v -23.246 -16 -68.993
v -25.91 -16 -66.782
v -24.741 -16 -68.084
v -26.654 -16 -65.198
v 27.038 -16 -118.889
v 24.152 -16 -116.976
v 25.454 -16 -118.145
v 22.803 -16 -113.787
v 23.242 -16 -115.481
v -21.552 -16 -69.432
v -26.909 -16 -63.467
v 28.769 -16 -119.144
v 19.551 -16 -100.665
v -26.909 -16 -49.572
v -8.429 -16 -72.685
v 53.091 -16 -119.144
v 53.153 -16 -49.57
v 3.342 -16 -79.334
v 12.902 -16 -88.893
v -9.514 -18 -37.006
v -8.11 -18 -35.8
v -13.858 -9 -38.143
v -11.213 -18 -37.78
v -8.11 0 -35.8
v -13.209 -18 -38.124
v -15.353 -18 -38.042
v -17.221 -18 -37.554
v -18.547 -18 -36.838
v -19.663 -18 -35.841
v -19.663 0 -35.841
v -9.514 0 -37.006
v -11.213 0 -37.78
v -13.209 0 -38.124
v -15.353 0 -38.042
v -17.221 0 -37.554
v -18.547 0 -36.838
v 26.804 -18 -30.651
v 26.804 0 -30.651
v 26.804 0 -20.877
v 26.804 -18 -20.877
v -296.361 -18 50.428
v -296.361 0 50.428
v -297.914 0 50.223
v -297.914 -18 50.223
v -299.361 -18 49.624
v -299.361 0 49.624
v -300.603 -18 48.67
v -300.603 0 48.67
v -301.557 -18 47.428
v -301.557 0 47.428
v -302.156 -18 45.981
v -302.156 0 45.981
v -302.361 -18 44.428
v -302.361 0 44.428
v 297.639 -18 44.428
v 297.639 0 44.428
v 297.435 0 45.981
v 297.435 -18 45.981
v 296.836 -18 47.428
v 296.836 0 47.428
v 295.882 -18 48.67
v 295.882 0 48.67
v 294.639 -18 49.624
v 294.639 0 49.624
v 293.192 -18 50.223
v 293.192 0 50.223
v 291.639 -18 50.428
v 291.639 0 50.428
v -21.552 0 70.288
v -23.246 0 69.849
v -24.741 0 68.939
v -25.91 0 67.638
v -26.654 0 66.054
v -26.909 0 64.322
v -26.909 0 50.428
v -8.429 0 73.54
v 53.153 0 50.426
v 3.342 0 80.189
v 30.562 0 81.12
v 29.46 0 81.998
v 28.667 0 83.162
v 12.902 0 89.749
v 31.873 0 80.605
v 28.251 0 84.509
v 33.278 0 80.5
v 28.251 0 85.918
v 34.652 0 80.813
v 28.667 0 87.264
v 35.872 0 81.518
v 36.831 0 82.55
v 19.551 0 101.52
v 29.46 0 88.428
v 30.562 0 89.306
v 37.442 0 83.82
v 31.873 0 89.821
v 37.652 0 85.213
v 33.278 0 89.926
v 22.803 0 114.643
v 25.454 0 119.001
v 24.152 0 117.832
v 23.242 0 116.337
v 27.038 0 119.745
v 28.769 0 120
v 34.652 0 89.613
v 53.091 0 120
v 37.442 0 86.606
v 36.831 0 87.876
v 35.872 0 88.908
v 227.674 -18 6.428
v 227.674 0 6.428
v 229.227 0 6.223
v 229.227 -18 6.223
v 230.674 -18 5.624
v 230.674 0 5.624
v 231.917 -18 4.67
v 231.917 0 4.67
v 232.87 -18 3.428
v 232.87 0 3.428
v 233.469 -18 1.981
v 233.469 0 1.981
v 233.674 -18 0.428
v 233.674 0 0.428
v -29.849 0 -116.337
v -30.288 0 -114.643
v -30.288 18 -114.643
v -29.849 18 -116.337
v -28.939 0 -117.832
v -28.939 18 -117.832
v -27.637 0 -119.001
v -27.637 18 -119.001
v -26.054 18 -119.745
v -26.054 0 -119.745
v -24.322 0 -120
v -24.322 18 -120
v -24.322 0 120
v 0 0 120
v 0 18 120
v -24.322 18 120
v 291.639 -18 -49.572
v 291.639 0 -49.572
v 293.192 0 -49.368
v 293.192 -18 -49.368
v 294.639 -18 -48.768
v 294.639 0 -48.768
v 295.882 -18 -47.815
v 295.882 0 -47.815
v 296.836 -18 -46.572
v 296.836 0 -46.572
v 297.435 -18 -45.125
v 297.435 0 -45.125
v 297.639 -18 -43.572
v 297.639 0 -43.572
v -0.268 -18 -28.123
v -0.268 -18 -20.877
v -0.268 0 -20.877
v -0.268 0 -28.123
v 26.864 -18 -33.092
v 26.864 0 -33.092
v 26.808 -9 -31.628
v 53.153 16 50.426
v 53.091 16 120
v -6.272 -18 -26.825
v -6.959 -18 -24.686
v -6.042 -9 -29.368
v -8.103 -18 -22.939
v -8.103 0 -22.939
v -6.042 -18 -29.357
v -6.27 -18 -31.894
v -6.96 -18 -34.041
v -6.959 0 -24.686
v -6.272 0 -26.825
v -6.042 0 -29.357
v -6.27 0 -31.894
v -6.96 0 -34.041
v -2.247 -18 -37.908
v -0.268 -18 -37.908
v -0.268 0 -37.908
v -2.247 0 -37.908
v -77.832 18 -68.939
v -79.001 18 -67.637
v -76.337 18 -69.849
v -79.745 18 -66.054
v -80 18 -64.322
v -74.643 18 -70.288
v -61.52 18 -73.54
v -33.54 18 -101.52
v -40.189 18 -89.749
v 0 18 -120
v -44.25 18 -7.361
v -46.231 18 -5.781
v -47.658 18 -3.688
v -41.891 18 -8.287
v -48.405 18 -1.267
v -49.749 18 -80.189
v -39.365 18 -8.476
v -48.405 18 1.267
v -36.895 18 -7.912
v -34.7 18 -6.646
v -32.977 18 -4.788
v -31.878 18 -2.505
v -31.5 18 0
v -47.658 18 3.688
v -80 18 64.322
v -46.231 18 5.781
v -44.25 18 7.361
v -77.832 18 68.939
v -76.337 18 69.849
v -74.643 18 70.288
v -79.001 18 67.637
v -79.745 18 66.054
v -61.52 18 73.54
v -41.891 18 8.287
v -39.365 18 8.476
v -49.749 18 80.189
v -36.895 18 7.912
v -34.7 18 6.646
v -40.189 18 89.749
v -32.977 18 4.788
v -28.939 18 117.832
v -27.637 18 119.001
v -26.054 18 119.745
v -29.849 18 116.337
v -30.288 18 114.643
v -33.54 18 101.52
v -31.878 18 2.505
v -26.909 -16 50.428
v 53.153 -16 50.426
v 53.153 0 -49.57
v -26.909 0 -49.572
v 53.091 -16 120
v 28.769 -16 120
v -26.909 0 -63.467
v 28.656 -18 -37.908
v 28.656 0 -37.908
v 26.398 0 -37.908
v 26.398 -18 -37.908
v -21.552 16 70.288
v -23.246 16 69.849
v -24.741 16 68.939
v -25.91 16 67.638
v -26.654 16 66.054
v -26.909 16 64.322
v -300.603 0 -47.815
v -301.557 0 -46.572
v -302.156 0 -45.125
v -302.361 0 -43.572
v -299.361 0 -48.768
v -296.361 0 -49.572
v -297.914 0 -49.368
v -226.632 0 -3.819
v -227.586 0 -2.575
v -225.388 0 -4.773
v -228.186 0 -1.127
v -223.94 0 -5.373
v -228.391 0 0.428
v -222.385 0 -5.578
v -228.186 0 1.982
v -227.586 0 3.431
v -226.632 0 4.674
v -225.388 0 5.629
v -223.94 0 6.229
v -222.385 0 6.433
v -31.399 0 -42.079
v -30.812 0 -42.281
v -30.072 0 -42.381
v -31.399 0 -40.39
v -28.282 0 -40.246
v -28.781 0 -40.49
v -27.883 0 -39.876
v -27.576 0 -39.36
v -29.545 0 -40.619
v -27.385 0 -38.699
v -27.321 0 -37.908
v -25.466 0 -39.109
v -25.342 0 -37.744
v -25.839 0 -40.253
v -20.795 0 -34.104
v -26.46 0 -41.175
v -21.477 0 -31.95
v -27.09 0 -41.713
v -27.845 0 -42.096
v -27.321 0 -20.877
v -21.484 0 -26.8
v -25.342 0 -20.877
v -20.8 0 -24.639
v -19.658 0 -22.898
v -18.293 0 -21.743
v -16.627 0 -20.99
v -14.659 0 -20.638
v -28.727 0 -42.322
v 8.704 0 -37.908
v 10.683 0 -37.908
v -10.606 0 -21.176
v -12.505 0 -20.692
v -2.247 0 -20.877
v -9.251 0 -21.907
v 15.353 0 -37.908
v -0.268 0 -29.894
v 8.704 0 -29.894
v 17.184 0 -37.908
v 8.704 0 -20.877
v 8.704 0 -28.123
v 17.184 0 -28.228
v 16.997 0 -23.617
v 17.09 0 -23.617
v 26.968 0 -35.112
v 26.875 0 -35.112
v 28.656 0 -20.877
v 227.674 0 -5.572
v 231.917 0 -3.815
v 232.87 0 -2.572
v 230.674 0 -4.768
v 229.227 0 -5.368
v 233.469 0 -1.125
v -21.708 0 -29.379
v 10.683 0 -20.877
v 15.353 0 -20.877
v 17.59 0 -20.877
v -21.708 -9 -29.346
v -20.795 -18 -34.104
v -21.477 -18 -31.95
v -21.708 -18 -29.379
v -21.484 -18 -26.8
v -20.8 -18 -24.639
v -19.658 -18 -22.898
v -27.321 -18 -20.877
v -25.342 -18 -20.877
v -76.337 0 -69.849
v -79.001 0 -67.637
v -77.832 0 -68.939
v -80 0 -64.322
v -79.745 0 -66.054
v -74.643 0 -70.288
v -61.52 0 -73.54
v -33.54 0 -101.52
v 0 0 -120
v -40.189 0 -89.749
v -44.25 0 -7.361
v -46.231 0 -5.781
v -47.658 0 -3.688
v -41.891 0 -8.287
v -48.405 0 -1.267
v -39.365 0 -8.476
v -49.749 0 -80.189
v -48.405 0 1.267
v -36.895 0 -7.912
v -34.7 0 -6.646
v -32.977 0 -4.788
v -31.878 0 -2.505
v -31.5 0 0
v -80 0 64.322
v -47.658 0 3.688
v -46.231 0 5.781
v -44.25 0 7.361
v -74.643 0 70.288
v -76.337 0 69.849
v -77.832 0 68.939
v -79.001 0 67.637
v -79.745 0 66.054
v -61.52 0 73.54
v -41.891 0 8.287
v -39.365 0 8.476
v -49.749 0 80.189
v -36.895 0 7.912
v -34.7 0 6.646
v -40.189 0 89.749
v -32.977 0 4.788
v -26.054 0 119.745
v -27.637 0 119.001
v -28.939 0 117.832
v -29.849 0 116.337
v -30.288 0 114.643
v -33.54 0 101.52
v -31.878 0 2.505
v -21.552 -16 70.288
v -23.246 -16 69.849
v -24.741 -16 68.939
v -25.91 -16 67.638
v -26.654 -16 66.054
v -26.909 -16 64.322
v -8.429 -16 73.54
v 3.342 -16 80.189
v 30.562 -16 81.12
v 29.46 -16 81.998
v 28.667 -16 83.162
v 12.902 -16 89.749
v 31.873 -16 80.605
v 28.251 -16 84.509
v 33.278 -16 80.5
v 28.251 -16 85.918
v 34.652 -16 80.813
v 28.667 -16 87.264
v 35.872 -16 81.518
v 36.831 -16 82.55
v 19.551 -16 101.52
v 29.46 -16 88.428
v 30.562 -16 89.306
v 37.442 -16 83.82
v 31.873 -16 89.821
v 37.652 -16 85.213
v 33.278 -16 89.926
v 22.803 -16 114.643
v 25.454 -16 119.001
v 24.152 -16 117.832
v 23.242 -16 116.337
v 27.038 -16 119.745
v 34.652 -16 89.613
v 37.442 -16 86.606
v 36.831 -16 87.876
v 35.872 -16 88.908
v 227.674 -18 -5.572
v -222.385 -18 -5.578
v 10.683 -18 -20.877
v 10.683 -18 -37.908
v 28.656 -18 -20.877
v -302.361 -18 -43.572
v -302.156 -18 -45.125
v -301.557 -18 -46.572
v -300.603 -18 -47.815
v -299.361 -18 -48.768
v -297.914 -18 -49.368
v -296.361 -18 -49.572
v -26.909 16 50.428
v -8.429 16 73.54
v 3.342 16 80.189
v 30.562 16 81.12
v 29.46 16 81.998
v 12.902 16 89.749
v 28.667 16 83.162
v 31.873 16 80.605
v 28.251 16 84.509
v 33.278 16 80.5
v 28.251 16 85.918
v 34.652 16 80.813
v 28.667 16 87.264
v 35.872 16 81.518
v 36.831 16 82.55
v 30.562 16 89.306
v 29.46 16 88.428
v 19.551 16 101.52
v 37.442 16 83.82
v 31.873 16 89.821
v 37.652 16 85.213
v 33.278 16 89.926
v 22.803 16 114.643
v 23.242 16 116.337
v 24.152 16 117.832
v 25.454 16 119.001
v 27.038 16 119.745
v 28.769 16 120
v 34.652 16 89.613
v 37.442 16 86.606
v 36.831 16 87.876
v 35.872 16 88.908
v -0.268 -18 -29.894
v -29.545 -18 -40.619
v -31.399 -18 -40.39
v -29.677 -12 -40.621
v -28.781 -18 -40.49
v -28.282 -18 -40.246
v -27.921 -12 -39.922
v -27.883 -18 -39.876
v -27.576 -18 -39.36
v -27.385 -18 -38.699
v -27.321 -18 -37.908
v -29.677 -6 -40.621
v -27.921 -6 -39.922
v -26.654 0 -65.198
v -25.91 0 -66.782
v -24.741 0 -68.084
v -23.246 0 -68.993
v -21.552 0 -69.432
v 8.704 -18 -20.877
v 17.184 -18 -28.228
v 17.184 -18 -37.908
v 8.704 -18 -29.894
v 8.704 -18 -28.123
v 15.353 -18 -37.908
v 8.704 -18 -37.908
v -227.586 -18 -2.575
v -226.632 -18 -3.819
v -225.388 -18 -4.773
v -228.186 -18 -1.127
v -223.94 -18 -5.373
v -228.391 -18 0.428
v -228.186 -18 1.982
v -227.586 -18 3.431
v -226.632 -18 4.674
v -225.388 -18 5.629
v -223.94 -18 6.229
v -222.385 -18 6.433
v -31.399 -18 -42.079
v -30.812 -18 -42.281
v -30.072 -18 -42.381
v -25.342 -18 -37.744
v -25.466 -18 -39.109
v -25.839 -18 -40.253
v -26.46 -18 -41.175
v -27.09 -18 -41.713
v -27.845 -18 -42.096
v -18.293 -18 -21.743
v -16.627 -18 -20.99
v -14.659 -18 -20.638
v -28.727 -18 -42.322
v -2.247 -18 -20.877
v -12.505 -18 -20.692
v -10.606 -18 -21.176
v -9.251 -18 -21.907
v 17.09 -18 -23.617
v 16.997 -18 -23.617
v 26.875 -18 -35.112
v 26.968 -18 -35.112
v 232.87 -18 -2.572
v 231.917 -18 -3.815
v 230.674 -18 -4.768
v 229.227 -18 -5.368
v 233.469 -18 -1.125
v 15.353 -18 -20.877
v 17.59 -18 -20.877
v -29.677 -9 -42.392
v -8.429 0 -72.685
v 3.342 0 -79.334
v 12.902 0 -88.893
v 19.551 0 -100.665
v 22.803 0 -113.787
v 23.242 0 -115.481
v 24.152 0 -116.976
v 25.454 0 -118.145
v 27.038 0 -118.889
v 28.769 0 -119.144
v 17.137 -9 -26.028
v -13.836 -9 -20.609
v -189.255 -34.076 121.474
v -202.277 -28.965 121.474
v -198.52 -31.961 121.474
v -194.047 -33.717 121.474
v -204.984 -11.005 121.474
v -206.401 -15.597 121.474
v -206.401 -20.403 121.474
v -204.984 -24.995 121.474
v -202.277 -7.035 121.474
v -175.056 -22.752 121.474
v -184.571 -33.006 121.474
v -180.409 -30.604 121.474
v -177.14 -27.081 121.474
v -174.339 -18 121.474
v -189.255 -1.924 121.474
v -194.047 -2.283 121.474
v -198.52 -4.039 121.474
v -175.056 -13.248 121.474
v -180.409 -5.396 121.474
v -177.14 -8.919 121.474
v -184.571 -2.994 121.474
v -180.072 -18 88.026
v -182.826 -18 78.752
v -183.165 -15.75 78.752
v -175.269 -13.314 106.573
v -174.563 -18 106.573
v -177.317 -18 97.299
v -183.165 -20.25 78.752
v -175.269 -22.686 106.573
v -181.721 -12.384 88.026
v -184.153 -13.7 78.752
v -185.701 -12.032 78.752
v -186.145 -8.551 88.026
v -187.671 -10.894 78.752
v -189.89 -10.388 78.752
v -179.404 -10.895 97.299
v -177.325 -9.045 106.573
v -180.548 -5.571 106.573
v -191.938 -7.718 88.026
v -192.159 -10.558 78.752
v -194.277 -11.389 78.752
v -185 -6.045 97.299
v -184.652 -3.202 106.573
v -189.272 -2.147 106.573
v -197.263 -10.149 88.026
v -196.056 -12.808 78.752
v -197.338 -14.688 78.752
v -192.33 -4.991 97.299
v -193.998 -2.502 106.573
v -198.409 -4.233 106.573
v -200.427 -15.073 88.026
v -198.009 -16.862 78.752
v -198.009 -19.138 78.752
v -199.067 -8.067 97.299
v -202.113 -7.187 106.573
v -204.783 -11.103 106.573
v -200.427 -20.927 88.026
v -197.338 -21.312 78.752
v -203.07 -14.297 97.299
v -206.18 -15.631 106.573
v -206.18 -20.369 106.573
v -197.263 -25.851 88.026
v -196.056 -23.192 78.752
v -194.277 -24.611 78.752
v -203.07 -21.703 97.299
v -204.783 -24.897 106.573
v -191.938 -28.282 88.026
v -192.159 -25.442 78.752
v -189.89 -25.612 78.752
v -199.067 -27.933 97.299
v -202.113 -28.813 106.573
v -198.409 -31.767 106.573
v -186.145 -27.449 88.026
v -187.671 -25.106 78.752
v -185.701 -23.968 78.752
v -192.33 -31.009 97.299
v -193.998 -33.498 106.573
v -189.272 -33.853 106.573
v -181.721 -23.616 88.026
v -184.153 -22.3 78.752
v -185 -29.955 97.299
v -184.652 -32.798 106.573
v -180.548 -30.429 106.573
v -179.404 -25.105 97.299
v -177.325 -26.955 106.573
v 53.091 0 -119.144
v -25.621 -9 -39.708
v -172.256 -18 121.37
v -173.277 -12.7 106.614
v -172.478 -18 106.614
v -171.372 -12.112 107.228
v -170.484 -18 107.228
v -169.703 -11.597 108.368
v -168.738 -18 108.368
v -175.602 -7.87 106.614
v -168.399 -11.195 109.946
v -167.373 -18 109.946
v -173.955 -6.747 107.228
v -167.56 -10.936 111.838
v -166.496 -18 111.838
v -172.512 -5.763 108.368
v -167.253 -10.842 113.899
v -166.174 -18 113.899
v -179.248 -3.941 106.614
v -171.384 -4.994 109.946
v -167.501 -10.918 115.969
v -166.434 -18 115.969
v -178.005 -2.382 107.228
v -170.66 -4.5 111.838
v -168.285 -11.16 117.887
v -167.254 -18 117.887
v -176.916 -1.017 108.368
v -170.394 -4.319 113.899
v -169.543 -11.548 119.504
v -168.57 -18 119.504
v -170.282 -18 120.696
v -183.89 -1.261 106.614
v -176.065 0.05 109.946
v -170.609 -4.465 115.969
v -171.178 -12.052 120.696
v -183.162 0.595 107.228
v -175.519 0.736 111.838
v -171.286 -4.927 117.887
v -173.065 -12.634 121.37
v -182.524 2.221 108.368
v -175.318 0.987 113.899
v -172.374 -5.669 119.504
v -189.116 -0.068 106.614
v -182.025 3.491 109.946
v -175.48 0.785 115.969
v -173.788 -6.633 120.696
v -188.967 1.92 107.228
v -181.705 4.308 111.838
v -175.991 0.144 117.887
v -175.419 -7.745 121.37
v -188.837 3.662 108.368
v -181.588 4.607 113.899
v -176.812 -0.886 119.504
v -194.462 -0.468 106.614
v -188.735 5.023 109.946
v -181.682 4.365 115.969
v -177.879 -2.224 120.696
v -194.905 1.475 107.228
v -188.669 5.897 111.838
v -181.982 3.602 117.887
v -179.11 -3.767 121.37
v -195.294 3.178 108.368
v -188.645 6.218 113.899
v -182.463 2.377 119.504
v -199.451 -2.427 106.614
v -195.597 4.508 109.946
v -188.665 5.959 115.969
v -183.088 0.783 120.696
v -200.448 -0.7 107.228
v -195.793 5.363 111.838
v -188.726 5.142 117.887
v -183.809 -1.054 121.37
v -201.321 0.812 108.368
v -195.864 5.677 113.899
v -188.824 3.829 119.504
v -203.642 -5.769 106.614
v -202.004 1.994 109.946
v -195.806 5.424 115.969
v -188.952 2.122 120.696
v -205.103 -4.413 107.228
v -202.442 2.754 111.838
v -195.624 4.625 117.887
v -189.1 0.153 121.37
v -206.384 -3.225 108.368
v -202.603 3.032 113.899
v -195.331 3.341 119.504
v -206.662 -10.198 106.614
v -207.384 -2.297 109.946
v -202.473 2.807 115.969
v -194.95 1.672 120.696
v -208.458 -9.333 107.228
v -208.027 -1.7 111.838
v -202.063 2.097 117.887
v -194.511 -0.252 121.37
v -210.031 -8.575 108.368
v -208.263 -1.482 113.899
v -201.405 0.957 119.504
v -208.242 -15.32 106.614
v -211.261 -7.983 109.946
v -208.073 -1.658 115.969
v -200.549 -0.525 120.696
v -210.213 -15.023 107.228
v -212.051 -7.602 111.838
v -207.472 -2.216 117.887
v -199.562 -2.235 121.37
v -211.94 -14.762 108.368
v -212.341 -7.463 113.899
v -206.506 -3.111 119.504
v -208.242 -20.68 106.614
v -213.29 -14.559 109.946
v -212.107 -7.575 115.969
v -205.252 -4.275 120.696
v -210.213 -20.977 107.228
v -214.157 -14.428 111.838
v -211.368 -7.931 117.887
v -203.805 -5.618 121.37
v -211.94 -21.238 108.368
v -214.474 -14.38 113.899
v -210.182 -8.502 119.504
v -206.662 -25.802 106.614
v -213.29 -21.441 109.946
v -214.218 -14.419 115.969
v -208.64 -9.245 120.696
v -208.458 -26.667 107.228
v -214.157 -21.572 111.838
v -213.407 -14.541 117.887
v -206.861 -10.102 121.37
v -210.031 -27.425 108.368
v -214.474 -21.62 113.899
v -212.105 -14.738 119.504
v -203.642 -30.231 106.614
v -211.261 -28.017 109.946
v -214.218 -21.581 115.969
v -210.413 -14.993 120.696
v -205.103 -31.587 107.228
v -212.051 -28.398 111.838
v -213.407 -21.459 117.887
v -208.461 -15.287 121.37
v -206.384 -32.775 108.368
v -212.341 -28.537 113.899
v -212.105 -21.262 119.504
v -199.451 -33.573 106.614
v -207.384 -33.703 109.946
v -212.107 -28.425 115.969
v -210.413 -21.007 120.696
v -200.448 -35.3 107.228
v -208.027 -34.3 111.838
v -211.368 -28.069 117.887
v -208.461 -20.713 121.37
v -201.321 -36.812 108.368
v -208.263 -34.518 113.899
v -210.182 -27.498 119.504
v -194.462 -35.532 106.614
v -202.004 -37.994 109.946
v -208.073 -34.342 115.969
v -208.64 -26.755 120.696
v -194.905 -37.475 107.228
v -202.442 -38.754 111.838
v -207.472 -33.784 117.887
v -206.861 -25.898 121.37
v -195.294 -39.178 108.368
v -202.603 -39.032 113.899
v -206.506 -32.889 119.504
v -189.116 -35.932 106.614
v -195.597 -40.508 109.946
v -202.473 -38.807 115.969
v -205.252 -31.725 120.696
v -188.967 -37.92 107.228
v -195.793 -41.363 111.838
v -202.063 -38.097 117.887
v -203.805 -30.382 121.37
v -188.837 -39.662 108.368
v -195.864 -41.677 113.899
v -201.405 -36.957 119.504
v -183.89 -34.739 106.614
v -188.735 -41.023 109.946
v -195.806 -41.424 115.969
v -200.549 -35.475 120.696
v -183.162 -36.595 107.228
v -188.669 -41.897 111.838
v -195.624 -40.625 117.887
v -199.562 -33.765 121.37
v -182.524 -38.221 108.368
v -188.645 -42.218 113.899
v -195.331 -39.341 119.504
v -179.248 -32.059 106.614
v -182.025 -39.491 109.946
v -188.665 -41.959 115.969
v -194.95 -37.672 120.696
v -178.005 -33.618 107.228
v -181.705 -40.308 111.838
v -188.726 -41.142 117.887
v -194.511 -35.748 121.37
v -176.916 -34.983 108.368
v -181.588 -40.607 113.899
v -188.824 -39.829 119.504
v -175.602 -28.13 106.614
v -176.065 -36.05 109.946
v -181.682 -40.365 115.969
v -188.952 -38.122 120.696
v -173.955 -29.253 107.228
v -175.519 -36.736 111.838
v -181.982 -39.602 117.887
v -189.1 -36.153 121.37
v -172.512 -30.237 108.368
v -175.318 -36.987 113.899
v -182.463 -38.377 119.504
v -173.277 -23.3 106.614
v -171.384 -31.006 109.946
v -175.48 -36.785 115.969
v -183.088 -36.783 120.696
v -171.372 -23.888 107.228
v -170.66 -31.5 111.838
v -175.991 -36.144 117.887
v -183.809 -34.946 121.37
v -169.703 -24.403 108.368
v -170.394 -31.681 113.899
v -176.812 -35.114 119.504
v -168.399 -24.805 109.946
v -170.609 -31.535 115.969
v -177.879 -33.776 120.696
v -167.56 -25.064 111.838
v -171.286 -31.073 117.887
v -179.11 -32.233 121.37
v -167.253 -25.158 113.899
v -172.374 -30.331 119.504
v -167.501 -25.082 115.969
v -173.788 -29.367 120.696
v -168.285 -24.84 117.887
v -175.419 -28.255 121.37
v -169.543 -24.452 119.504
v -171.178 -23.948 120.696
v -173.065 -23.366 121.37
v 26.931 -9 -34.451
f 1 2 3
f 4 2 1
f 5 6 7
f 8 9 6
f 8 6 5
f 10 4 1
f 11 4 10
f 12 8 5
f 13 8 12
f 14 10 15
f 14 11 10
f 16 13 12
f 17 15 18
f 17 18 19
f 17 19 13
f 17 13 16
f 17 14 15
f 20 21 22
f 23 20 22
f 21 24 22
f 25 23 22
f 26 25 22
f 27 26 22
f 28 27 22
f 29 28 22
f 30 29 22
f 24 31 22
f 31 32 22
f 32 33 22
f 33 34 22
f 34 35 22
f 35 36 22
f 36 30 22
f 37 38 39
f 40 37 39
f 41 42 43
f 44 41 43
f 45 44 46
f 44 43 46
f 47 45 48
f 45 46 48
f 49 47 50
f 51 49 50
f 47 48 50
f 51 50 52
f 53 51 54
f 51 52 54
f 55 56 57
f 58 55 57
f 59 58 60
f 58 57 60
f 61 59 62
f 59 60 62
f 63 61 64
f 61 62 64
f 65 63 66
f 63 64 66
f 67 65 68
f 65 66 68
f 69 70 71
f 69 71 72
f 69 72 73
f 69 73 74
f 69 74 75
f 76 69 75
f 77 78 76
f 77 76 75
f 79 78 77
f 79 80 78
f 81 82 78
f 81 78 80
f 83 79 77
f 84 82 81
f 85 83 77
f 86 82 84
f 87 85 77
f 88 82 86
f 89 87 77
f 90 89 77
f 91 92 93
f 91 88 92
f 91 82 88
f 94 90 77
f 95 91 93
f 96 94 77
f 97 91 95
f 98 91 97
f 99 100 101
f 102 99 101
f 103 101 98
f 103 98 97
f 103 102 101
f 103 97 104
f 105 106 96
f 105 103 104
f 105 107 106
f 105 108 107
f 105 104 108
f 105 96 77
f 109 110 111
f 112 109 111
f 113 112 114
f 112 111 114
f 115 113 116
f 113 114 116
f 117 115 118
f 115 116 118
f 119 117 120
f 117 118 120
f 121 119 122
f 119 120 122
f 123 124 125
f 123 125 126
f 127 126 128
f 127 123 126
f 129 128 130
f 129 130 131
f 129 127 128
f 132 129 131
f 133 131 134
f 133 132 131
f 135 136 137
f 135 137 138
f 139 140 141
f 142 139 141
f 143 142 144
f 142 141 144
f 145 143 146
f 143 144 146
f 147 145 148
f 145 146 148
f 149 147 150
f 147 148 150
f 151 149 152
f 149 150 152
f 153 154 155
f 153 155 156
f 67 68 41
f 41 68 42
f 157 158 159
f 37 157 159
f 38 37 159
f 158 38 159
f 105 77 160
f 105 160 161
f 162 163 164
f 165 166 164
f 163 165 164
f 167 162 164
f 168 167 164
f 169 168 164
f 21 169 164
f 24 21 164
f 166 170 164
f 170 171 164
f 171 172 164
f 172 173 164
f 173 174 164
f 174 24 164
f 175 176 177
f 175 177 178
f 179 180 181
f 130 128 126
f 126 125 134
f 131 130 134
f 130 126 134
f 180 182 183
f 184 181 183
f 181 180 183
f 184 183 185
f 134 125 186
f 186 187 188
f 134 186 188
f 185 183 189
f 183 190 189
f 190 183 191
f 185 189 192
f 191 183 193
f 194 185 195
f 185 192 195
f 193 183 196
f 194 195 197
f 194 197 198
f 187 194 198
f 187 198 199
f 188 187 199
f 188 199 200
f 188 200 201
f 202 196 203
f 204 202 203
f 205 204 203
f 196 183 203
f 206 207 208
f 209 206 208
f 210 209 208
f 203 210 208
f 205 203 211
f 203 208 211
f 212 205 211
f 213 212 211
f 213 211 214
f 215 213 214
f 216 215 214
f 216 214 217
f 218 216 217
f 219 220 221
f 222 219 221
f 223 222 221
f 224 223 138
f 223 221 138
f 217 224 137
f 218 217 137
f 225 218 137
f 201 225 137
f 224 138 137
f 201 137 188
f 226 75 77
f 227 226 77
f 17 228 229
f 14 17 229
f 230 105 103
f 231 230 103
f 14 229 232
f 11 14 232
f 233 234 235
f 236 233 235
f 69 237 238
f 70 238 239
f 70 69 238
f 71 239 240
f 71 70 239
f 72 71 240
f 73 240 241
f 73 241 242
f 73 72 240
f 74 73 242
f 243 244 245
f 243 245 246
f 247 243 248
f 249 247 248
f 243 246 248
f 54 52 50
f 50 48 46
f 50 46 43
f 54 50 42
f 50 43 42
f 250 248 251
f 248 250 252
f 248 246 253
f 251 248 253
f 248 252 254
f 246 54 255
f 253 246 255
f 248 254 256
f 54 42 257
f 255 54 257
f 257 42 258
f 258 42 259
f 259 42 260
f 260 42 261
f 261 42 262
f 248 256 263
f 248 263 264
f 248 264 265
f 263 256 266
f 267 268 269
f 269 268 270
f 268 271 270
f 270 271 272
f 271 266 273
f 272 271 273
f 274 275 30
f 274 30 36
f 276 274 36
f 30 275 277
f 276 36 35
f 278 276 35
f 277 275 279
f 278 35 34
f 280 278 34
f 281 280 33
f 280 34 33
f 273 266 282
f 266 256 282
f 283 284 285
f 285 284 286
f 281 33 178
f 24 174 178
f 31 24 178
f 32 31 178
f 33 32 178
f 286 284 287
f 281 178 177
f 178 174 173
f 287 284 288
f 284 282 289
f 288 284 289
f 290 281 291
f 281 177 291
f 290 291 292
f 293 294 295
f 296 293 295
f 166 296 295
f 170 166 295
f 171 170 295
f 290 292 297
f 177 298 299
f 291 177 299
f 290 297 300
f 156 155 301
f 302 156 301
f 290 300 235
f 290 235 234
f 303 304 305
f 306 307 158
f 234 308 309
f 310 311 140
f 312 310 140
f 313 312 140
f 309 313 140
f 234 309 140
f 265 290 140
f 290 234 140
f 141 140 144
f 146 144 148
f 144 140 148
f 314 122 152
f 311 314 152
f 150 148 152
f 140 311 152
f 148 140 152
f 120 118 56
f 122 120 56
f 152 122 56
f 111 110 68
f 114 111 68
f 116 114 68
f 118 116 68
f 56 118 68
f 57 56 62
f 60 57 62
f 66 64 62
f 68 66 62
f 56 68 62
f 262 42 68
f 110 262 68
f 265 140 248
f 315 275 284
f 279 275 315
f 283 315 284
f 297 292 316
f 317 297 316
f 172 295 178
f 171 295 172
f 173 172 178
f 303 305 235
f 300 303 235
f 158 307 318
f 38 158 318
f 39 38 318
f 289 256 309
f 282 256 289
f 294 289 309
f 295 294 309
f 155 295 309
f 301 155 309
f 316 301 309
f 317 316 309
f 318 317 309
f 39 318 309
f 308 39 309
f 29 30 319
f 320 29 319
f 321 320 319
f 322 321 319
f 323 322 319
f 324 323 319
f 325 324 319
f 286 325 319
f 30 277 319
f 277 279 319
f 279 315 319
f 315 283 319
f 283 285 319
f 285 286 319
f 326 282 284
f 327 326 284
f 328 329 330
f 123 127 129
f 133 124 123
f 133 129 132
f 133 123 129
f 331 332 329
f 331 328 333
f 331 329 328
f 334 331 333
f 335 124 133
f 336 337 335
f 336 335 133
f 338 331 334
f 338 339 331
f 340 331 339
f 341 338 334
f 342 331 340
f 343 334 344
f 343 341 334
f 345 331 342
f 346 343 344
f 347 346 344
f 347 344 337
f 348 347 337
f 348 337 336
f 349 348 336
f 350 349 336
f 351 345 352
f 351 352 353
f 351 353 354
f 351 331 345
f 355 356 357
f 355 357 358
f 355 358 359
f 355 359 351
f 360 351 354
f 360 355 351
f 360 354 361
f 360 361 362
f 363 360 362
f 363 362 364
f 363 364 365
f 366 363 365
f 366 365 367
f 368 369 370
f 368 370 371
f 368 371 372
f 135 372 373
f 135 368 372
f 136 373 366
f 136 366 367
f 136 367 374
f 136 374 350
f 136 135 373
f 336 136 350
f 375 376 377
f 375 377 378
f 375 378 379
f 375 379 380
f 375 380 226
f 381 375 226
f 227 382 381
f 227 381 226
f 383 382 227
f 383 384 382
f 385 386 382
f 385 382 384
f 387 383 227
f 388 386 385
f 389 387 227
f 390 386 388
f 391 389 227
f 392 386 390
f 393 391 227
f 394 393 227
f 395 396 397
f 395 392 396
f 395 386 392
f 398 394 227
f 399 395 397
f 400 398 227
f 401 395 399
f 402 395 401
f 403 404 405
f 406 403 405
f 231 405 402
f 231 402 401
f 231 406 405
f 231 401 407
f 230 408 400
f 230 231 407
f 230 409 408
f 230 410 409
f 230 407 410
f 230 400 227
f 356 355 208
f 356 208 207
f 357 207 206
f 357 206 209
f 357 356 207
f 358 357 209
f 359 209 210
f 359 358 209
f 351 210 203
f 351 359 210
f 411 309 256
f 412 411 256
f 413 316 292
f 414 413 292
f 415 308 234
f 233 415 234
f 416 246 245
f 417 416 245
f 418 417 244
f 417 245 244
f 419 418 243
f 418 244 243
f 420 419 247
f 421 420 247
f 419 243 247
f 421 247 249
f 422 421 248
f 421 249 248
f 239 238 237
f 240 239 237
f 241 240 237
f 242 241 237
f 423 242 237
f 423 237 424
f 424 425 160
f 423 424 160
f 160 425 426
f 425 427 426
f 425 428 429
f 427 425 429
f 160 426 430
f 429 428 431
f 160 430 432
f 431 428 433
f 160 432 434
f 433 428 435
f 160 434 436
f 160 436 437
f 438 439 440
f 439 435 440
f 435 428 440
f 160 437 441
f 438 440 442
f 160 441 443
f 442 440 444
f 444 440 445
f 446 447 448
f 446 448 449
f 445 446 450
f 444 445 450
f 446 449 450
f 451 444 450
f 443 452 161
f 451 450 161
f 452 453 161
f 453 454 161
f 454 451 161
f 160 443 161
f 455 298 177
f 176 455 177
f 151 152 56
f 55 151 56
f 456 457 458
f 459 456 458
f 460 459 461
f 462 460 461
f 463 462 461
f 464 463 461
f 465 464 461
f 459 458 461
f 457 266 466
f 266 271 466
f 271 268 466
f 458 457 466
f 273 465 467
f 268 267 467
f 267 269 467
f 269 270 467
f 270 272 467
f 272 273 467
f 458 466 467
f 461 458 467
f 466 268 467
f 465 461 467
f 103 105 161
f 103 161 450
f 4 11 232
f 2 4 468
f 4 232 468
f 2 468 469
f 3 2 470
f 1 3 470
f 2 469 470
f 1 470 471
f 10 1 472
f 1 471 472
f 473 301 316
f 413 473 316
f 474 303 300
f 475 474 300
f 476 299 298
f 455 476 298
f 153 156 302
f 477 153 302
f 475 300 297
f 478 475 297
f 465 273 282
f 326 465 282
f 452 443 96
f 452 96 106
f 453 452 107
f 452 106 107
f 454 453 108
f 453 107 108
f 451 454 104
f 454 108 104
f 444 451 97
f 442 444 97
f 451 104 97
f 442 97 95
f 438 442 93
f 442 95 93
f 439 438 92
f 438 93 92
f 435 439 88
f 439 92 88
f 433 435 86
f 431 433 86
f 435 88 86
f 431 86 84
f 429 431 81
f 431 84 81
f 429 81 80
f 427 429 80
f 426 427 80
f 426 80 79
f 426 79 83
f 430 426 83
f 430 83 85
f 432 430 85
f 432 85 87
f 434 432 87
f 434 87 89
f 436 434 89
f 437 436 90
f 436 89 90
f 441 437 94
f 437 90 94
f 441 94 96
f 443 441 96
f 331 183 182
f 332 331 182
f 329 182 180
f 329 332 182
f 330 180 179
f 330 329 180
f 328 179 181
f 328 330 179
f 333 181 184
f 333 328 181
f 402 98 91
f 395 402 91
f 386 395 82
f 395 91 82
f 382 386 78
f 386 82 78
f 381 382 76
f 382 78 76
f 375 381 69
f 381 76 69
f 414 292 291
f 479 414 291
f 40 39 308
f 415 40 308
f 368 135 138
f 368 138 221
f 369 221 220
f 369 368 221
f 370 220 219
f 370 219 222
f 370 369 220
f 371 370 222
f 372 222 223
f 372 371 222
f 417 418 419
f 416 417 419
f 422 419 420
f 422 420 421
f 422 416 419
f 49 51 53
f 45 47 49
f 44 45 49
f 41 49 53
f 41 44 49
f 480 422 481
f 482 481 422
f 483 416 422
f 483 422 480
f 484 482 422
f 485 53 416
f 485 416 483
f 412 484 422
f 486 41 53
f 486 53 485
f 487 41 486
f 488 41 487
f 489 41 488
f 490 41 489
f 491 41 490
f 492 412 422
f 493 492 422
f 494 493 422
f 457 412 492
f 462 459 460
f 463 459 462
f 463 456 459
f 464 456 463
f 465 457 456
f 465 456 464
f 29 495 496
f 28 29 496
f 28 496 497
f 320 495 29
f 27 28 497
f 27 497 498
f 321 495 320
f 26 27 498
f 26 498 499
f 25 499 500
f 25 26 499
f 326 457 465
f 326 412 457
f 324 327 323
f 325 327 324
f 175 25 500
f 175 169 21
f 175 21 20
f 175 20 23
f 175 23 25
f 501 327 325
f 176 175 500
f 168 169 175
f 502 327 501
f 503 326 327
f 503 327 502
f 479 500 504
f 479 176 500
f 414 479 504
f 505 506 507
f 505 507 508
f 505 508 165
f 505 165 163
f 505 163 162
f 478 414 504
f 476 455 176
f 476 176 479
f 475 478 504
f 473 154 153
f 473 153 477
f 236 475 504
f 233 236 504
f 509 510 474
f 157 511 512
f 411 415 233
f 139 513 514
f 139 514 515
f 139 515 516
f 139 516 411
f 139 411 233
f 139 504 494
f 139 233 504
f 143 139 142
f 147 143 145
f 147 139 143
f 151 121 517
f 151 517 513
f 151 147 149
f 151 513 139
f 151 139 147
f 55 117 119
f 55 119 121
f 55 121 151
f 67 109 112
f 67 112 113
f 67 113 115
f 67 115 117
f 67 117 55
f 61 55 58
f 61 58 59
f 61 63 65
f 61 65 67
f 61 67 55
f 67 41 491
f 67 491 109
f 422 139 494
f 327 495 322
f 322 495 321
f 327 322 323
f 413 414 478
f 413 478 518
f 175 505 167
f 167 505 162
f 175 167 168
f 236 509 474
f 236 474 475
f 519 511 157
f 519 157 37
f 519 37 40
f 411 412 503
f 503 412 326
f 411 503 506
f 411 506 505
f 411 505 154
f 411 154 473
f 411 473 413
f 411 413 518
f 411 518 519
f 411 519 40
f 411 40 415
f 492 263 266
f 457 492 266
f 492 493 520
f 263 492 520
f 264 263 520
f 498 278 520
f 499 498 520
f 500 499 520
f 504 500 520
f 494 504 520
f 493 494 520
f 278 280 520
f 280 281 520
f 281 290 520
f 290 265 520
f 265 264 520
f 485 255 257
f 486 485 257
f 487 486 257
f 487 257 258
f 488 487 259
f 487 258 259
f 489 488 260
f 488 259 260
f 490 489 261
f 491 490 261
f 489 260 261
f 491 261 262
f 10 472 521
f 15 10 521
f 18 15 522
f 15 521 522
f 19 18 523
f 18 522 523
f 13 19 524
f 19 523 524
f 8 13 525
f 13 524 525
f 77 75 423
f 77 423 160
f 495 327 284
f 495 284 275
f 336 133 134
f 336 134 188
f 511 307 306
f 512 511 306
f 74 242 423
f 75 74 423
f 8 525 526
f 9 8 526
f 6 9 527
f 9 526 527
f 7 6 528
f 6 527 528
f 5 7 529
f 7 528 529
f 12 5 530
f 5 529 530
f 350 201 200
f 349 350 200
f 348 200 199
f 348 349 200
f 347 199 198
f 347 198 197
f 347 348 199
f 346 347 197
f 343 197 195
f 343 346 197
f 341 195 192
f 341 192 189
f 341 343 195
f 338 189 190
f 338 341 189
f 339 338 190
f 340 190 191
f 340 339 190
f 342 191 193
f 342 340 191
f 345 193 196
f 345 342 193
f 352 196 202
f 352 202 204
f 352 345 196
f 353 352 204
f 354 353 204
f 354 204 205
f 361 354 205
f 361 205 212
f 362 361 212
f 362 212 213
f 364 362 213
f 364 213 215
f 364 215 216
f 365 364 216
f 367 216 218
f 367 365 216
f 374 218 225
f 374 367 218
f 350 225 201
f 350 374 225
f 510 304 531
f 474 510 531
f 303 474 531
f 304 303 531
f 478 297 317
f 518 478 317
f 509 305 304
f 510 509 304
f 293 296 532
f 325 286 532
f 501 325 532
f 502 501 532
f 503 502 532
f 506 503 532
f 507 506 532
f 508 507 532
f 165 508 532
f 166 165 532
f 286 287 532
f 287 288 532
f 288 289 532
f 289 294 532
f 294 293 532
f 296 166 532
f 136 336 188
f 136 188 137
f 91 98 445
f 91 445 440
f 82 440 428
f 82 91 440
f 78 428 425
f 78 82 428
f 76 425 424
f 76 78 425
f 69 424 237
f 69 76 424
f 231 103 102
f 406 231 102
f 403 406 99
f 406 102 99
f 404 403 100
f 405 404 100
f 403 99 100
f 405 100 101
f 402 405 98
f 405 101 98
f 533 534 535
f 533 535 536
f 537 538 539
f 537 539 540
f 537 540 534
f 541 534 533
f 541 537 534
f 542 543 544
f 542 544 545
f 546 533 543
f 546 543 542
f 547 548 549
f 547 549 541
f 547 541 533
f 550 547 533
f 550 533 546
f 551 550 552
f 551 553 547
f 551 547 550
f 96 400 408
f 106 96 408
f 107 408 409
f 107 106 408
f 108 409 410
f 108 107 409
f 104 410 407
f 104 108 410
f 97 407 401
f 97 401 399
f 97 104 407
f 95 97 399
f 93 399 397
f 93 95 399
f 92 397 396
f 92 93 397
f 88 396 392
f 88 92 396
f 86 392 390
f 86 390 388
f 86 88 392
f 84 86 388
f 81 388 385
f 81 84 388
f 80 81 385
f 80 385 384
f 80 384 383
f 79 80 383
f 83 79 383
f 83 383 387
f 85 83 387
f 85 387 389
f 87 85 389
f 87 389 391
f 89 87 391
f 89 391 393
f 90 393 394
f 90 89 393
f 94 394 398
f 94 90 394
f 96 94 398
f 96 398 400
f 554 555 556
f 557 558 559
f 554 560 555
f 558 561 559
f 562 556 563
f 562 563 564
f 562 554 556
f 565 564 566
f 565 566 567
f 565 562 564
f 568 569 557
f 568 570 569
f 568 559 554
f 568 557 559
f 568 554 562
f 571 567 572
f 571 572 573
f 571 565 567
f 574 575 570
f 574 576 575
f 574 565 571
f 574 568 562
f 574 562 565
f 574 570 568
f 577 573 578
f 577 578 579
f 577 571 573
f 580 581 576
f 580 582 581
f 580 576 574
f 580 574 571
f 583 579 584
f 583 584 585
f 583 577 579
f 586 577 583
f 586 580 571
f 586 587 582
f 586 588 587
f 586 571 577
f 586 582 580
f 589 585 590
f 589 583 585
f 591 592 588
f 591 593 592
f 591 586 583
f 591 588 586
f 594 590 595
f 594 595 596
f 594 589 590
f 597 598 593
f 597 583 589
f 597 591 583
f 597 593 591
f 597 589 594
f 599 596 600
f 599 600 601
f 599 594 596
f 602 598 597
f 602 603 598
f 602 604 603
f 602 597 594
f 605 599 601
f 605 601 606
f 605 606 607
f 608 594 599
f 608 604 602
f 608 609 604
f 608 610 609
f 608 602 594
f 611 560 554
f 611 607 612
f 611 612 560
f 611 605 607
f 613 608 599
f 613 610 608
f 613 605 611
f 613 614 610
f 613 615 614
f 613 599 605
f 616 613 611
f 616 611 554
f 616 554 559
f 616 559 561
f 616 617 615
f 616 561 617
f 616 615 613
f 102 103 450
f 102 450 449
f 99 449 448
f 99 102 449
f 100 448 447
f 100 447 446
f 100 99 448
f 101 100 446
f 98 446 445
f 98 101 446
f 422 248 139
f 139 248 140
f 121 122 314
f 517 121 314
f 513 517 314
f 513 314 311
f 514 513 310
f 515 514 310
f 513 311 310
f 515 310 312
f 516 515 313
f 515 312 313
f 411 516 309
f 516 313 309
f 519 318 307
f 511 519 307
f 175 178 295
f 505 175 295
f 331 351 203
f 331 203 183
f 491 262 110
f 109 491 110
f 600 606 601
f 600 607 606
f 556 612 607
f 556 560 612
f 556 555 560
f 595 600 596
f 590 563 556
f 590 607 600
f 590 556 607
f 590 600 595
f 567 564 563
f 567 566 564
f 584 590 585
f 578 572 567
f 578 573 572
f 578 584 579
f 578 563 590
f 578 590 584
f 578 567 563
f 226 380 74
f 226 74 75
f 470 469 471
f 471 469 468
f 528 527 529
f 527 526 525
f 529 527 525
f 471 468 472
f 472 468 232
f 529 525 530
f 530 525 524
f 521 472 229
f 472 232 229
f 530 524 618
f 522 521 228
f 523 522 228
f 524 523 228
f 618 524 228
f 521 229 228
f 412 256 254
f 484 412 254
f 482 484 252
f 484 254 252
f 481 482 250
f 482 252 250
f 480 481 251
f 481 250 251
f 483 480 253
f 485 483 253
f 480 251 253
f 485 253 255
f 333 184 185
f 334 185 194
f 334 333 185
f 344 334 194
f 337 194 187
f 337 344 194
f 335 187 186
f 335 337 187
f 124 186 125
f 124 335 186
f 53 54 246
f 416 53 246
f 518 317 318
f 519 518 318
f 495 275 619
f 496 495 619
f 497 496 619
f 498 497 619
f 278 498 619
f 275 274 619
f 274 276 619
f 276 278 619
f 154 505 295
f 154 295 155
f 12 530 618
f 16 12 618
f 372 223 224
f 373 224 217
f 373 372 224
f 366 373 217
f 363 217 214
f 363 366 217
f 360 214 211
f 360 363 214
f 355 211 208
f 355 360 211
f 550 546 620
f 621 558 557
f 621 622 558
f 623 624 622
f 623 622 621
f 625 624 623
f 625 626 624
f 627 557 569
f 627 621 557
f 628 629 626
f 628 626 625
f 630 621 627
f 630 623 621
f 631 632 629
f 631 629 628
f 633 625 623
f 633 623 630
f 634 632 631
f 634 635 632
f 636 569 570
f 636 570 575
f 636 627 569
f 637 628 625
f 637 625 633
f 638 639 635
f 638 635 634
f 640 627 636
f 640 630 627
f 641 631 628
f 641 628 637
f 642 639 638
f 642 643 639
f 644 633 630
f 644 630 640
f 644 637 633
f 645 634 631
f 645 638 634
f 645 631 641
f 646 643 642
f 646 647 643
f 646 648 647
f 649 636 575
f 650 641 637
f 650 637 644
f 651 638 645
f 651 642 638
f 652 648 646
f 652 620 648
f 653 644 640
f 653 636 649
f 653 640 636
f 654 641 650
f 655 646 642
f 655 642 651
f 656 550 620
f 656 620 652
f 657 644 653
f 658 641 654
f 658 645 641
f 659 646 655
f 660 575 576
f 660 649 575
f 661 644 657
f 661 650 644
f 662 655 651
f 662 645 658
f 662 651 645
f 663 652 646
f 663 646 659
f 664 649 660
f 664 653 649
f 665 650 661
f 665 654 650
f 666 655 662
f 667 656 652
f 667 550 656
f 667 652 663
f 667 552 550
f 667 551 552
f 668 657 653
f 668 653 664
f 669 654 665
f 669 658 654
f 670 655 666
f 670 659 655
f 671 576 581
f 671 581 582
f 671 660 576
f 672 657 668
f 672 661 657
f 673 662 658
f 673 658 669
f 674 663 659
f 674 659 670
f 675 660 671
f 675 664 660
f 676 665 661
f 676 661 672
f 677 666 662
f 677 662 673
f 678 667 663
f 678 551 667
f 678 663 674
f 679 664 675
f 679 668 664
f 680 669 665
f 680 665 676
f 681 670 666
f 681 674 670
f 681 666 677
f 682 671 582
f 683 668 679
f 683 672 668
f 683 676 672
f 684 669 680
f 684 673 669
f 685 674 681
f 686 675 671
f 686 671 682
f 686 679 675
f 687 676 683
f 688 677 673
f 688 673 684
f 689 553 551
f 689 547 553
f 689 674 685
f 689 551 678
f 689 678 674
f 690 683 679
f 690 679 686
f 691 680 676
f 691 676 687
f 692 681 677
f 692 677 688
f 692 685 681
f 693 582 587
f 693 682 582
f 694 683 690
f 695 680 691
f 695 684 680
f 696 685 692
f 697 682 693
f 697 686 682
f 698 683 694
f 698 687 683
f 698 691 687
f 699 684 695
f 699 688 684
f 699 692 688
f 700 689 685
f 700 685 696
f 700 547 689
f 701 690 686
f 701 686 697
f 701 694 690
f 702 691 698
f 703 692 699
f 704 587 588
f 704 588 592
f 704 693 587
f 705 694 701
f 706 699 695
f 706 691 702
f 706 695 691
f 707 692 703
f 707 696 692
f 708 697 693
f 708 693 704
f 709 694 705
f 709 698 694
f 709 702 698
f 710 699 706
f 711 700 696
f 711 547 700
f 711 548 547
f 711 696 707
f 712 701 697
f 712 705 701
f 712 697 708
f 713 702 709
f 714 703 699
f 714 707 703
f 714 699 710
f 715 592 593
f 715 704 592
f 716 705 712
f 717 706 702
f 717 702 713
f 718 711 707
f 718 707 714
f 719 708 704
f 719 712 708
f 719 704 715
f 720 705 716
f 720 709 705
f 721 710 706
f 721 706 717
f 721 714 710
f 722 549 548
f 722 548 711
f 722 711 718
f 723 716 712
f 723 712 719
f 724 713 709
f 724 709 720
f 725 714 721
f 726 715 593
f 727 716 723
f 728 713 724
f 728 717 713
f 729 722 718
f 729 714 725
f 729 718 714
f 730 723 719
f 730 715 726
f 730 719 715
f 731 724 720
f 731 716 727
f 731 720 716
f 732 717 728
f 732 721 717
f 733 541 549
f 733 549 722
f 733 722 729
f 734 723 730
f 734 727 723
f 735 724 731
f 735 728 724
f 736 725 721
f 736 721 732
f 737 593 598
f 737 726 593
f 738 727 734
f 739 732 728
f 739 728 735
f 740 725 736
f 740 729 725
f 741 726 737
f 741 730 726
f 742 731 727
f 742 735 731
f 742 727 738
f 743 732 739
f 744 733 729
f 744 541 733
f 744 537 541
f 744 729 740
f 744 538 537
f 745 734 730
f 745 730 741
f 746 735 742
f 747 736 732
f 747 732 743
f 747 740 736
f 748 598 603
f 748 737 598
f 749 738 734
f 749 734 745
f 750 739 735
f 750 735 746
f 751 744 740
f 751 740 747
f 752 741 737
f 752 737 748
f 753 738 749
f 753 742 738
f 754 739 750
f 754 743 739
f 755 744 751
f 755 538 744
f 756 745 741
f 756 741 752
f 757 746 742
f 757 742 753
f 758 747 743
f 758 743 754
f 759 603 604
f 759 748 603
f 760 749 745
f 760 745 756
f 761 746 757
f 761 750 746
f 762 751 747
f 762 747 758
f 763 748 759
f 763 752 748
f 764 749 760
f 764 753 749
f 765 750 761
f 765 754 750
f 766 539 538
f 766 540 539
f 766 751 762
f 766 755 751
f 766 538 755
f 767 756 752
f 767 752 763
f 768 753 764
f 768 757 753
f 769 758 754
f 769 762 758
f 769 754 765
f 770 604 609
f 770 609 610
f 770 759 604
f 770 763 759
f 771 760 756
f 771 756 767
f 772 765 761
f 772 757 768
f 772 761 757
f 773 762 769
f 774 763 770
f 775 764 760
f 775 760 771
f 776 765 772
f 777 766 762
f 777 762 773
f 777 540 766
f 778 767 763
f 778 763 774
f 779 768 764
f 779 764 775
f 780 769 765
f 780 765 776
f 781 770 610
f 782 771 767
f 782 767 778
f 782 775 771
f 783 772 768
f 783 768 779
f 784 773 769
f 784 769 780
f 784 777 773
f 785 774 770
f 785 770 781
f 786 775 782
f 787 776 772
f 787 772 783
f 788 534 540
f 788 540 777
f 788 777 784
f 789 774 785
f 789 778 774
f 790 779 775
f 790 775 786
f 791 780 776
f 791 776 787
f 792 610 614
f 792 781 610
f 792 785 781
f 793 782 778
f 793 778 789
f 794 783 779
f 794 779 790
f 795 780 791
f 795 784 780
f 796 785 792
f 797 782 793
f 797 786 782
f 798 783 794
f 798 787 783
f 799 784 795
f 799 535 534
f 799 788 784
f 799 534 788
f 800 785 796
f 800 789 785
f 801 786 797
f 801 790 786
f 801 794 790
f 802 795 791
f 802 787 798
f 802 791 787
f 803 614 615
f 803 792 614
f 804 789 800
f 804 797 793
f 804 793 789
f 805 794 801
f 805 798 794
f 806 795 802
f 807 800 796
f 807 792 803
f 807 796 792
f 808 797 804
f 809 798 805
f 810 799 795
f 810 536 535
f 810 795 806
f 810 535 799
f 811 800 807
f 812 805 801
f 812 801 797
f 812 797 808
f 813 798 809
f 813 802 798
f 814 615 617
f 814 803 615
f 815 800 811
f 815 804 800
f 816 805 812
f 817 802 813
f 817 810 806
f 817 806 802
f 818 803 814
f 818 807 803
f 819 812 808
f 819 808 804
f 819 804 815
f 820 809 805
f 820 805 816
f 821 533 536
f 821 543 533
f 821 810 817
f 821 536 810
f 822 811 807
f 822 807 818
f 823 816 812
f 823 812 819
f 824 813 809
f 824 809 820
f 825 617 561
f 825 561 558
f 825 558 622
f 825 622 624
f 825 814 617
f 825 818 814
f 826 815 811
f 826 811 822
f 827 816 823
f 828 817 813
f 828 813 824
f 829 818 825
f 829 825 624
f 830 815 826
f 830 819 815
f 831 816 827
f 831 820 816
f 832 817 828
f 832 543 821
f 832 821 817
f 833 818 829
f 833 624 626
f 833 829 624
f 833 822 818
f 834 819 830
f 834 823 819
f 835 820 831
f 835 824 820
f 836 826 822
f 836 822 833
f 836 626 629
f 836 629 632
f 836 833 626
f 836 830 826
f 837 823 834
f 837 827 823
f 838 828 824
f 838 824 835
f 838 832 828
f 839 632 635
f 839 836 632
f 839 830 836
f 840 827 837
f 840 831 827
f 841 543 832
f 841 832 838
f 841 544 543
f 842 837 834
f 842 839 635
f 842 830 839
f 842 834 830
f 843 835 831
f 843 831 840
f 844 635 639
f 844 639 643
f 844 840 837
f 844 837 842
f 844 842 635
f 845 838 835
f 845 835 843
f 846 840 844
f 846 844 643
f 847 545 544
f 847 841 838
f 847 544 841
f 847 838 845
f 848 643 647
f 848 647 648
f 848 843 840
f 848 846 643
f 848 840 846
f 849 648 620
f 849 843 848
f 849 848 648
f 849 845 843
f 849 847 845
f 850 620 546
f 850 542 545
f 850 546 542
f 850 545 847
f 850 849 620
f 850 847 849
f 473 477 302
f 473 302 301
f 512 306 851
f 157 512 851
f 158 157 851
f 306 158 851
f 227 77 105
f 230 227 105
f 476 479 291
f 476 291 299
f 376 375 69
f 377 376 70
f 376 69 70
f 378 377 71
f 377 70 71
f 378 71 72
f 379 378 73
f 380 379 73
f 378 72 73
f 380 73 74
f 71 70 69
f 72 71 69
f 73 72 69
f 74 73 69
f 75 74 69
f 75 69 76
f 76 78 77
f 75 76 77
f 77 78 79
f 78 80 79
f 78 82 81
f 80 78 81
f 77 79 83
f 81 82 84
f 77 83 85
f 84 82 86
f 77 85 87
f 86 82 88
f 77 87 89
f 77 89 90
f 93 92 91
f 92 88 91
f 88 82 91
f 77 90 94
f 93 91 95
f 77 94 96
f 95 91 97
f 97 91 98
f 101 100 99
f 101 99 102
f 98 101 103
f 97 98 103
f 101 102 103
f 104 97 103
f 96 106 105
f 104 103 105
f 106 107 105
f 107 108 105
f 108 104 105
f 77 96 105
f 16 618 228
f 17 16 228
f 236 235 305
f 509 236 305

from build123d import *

# Parameters (mm, degrees)
F1_DEPTH = 18
F3_DEPTH = 18
F5_R     = 4.7266267097
F6_DEPTH = 16


# Not quite as in the source:
# - the program builds the solid bodies; features that only make, move or delete a surface that nothing else refers to are left out


with BuildPart() as f1:
    # F0 (on Front) → F1 (new body)
    with BuildSketch(Plane.XZ):
        with BuildLine():
            Line((291.639387846, 50.4278332508), (-296.360612154, 50.4278332508))
            ThreePointArc((-296.360612154, 50.4278332508), (-300.6032528411, 48.6704739379), (-302.360612154, 44.4278332508))
            Line((-302.360612154, 44.4278332508), (-302.360612154, 0.4278332508))
            Line((-302.360612154, 0.4278332508), (-228.3910287511, 0.4278332508))
            ThreePointArc((-228.3910287511, 0.4278332508), (-226.6320094967, 4.6744441775), (-222.3853767709, 6.4334108038))
            Line((-222.3853767709, 6.4334108038), (227.6739476629, 6.4278332503))
            ThreePointArc((227.6739476629, 6.4278332503), (231.9165402817, 4.6704476485), (233.6738733053, 0.4278332508))
            Line((233.6738733053, 0.4278332508), (297.639387846, 0.4278332508))
            Line((297.639387846, 0.4278332508), (297.639387846, 44.4278332508))
            ThreePointArc((297.639387846, 44.4278332508), (295.8820285331, 48.6704739379), (291.639387846, 50.4278332508))
        make_face()
        with BuildLine():
            Line((-228.3910287511, 0.4278332508), (-302.360612154, 0.4278332508))
            Line((-302.360612154, 0.4278332508), (-302.360612154, -43.5721667492))
            ThreePointArc((-302.360612154, -43.5721667492), (-300.6032528411, -47.8148074363), (-296.360612154, -49.5721667492))
            Line((-296.360612154, -49.5721667492), (291.639387846, -49.5721667492))
            ThreePointArc((291.639387846, -49.5721667492), (295.8820285331, -47.8148074363), (297.639387846, -43.5721667492))
            Line((297.639387846, -43.5721667492), (297.639387846, 0.4278332508))
            Line((297.639387846, 0.4278332508), (233.6738733053, 0.4278332508))
            ThreePointArc((233.6738733053, 0.4278332508), (231.9165402817, -3.8147811469), (227.6739476629, -5.5721667487))
            Line((227.6739476629, -5.5721667487), (-222.3853767709, -5.5777443022))
            ThreePointArc((-222.3853767709, -5.5777443022), (-226.6320094967, -3.8187776759), (-228.3910287511, 0.4278332508))
        make_face()
        with BuildLine():
            add(Edge.make_bspline(
                [(-26.460121604, -41.1747165951), (-27.5783300604, -42.3917001317), (-29.6768345967, -42.3917001317)],
                knots=[0, 0, 0, 1, 1, 1], degree=2))
            add(Edge.make_bspline(
                [(-29.6768345967, -42.3917001317), (-30.7689515224, -42.3917001317), (-31.3988756194, -42.0786017639)],
                knots=[0, 0, 0, 1, 1, 1], degree=2))
            Line((-31.3988756194, -42.0786017639), (-31.3988756194, -40.3901069949))
            add(Edge.make_bspline(
                [(-31.3988756194, -40.3901069949), (-30.5714013618, -40.6212034092), (-29.6768345967, -40.6212034092)],
                knots=[0, 0, 0, 1, 1, 1], degree=2))
            add(Edge.make_bspline(
                [(-29.6768345967, -40.6212034092), (-28.5213525252, -40.6212034092), (-27.9212473203, -39.922323124)],
                knots=[0, 0, 0, 1, 1, 1], degree=2))
            add(Edge.make_bspline(
                [(-27.9212473203, -39.922323124), (-27.3211421154, -39.2234428388), (-27.3211421154, -37.9076842219)],
                knots=[0, 0, 0, 1, 1, 1], degree=2))
            Line((-27.3211421154, -37.9076842219), (-27.3211421154, -20.8773694321))
            Line((-27.3211421154, -20.8773694321), (-25.3419131477, -20.8773694321))
            Line((-25.3419131477, -20.8773694321), (-25.3419131477, -37.7436803149))
            add(Edge.make_bspline(
                [(-25.3419131477, -37.7436803149), (-25.3419131477, -39.9577330584), (-26.460121604, -41.1747165951)],
                knots=[0, 0, 0, 1, 1, 1], degree=2))
        make_face(mode=Mode.SUBTRACT)
        with BuildLine():
            add(Edge.make_bspline(
                [(-8.1028661128, -22.9386003533), (-6.0416351917, -25.2682013039), (-6.0416351917, -29.3682989771)],
                knots=[0, 0, 0, 1, 1, 1], degree=2))
            add(Edge.make_bspline(
                [(-6.0416351917, -29.3682989771), (-6.0416351917, -33.4572145657), (-8.1103208358, -35.7998612817)],
                knots=[0, 0, 0, 1, 1, 1], degree=2))
            add(Edge.make_bspline(
                [(-8.1103208358, -35.7998612817), (-10.17900648, -38.1425079977), (-13.8579123013, -38.1425079977)],
                knots=[0, 0, 0, 1, 1, 1], degree=2))
            add(Edge.make_bspline(
                [(-13.8579123013, -38.1425079977), (-17.6188200761, -38.1425079977), (-19.6632778704, -35.8408622584)],
                knots=[0, 0, 0, 1, 1, 1], degree=2))
            add(Edge.make_bspline(
                [(-19.6632778704, -35.8408622584), (-21.7077356647, -33.5392165192), (-21.7077356647, -29.345934808)],
                knots=[0, 0, 0, 1, 1, 1], degree=2))
            add(Edge.make_bspline(
                [(-21.7077356647, -29.345934808), (-21.7077356647, -25.1861993505), (-19.6576868281, -22.8975993765)],
                knots=[0, 0, 0, 1, 1, 1], degree=2))
            add(Edge.make_bspline(
                [(-19.6576868281, -22.8975993765), (-17.6076379915, -20.6089994026), (-13.8355481322, -20.6089994026)],
                knots=[0, 0, 0, 1, 1, 1], degree=2))
            add(Edge.make_bspline(
                [(-13.8355481322, -20.6089994026), (-10.1640970339, -20.6089994026), (-8.1028661128, -22.9386003533)],
                knots=[0, 0, 0, 1, 1, 1], degree=2))
        make_face(mode=Mode.SUBTRACT)
        Polygon((10.6830359534, -20.8773694321), (10.6830359534, -37.9076842219), (8.7038069857, -37.9076842219), (8.7038069857, -29.8938569516), (-0.2679521955, -29.8938569516), (-0.2679521955, -37.9076842219), (-2.2471811632, -37.9076842219), (-2.2471811632, -20.8773694321), (-0.2679521955, -20.8773694321), (-0.2679521955, -28.1233602291), (8.7038069857, -28.1233602291), (8.7038069857, -20.8773694321), align=None, mode=Mode.SUBTRACT)
        with BuildLine():
            Line((28.6563732079, -20.8773694321), (28.6563732079, -37.9076842219))
            Line((28.6563732079, -37.9076842219), (26.3975921262, -37.9076842219))
            Line((26.3975921262, -37.9076842219), (17.0903704081, -23.6169801501))
            Line((17.0903704081, -23.6169801501), (16.99718637, -23.6169801501))
            add(Edge.make_bspline(
                [(16.99718637, -23.6169801501), (17.1835544461, -26.1329491768), (17.1835544461, -28.2277263517)],
                knots=[0, 0, 0, 1, 1, 1], degree=2))
            Line((17.1835544461, -28.2277263517), (17.1835544461, -37.9076842219))
            Line((17.1835544461, -37.9076842219), (15.3534199393, -37.9076842219))
            Line((15.3534199393, -37.9076842219), (15.3534199393, -20.8773694321))
            Line((15.3534199393, -20.8773694321), (17.5898368519, -20.8773694321))
            Line((17.5898368519, -20.8773694321), (26.8746944009, -35.1121630811))
            Line((26.8746944009, -35.1121630811), (26.9678784389, -35.1121630811))
            add(Edge.make_bspline(
                [(26.9678784389, -35.1121630811), (26.9455142698, -34.7990647133), (26.8635123163, -33.0919331367)],
                knots=[0, 0, 0, 1, 1, 1], degree=2))
            add(Edge.make_bspline(
                [(26.8635123163, -33.0919331367), (26.7815103628, -31.38480156), (26.803874532, -30.6505113404)],
                knots=[0, 0, 0, 1, 1, 1], degree=2))
            Line((26.803874532, -30.6505113404), (26.803874532, -20.8773694321))
            Line((26.803874532, -20.8773694321), (28.6563732079, -20.8773694321))
        make_face(mode=Mode.SUBTRACT)
    extrude(amount=F1_DEPTH)


with BuildPart() as f3:
    # F2 (on Front) → F3 (new body)
    with BuildSketch(Plane.XZ):
        with BuildLine():
            Line((0, 0), (0, 120))
            Line((0, 120), (-24.3223563717, 120))
            ThreePointArc((-24.3223563717, 120), (-28.3312750004, 118.4641428549), (-30.287818189, 114.6428571429))
            ThreePointArc((-30.287818189, 114.6428571429), (-44.6446609407, 84.6446609407), (-74.6428571429, 70.287818189))
            ThreePointArc((-74.6428571429, 70.287818189), (-78.4641428549, 68.3312750004), (-80, 64.3223563717))
            Line((-80, 64.3223563717), (-80, 6))
            Line((-80, 6), (-80, 0))
            Line((-80, 0), (-48.5, 0))
            ThreePointArc((-48.5, 0), (-40, 8.5), (-31.5, 0))
            Line((-31.5, 0), (0, 0))
        make_face()
        with BuildLine():
            Line((0, -120), (0, 0))
            Line((0, 0), (-31.5, 0))
            ThreePointArc((-31.5, 0), (-40, -8.5), (-48.5, 0))
            Line((-48.5, 0), (-80, 0))
            Line((-80, 0), (-80, -6))
            Line((-80, -6), (-80, -64.3223563717))
            ThreePointArc((-80, -64.3223563717), (-78.4641428549, -68.3312750004), (-74.6428571429, -70.287818189))
            ThreePointArc((-74.6428571429, -70.287818189), (-44.6446609407, -84.6446609407), (-30.287818189, -114.6428571429))
            ThreePointArc((-30.287818189, -114.6428571429), (-28.3312750004, -118.4641428549), (-24.3223563717, -120))
            Line((-24.3223563717, -120), (0, -120))
        make_face()
    extrude(amount=-F3_DEPTH)


with BuildPart() as f6:
    # F5 (on Front) → F6 (new body)
    with BuildSketch(Plane.XZ):
        with BuildLine():
            ThreePointArc((28.7686937244, 120), (24.7597750957, 118.4641428549), (22.8032319071, 114.6428571429))
            ThreePointArc((22.8032319071, 114.6428571429), (8.4463891554, 84.6446609407), (-21.5518070468, 70.287818189))
            ThreePointArc((-21.5518070468, 70.287818189), (-25.3730533867, 68.3313188428), (-26.9089499028, 64.3224742245))
            Line((-26.9089499028, 64.3224742245), (-26.9092228264, 50.4276715219))
            Line((-26.9092228264, 50.4276715219), (53.1530342776, 50.4260989282))
            Line((53.1530342776, 50.4260989282), (53.0910500961, 120))
            Line((53.0910500961, 120), (28.7686937244, 120))
        make_face()
        with Locations((32.9252704978, 85.2130494641)):
            Circle(F5_R, mode=Mode.SUBTRACT)
    extrude(amount=F6_DEPTH)


with BuildPart() as f6b:
    # F5 (on Front) → F6, piece 2 (new body)
    with BuildSketch(Plane.XZ):
        with BuildLine():
            Line((53.0910500961, -119.1443334984), (53.1530342776, -49.5704324266))
            Line((53.1530342776, -49.5704324266), (-26.9092228264, -49.5720050203))
            Line((-26.9092228264, -49.5720050203), (-26.9089499028, -63.4668077229))
            ThreePointArc((-26.9089499028, -63.4668077229), (-25.3730533867, -67.4756523413), (-21.5518070468, -69.4321516874))
            ThreePointArc((-21.5518070468, -69.4321516874), (8.4463891554, -83.7889944391), (22.8032319071, -113.7871906413))
            ThreePointArc((22.8032319071, -113.7871906413), (24.7597750957, -117.6084763533), (28.7686937244, -119.1443334984))
            Line((28.7686937244, -119.1443334984), (53.0910500961, -119.1443334984))
        make_face()
    extrude(amount=F6_DEPTH)


with BuildPart() as f8:
    # F7 (on face) → F8 (revolve)
    with BuildSketch(Plane.XZ.offset(18)):
        with BuildLine():
            Line((-190.4600858688, 106.5727323294), (-190.4600858688, 78.7520706654))
            Line((-190.4600858688, 78.7520706654), (-182.8263103962, 78.7520706654))
            Line((-182.8263103962, 78.7520706654), (-174.5630651712, 106.5727323294))
            ThreePointArc((-174.5630651712, 106.5727323294), (-166.1744728131, 113.899124468), (-174.3393093348, 121.4740797877))
            Line((-174.3393093348, 121.4740797877), (-190.4600858688, 121.4740797877))
            Line((-190.4600858688, 121.4740797877), (-190.4600858688, 106.5727323294))
        make_face()
    revolve(axis=Axis((-190.4600858688, -18, 92.6624014974), (0, 0, 1)))


with BuildPart() as f9_1:
    # F9: instance of F6
    add(f6.part.mirror(Plane.XZ))


solid = Compound([f1.part, f3.part, f6.part, f6b.part, f8.part, f9_1.part])
